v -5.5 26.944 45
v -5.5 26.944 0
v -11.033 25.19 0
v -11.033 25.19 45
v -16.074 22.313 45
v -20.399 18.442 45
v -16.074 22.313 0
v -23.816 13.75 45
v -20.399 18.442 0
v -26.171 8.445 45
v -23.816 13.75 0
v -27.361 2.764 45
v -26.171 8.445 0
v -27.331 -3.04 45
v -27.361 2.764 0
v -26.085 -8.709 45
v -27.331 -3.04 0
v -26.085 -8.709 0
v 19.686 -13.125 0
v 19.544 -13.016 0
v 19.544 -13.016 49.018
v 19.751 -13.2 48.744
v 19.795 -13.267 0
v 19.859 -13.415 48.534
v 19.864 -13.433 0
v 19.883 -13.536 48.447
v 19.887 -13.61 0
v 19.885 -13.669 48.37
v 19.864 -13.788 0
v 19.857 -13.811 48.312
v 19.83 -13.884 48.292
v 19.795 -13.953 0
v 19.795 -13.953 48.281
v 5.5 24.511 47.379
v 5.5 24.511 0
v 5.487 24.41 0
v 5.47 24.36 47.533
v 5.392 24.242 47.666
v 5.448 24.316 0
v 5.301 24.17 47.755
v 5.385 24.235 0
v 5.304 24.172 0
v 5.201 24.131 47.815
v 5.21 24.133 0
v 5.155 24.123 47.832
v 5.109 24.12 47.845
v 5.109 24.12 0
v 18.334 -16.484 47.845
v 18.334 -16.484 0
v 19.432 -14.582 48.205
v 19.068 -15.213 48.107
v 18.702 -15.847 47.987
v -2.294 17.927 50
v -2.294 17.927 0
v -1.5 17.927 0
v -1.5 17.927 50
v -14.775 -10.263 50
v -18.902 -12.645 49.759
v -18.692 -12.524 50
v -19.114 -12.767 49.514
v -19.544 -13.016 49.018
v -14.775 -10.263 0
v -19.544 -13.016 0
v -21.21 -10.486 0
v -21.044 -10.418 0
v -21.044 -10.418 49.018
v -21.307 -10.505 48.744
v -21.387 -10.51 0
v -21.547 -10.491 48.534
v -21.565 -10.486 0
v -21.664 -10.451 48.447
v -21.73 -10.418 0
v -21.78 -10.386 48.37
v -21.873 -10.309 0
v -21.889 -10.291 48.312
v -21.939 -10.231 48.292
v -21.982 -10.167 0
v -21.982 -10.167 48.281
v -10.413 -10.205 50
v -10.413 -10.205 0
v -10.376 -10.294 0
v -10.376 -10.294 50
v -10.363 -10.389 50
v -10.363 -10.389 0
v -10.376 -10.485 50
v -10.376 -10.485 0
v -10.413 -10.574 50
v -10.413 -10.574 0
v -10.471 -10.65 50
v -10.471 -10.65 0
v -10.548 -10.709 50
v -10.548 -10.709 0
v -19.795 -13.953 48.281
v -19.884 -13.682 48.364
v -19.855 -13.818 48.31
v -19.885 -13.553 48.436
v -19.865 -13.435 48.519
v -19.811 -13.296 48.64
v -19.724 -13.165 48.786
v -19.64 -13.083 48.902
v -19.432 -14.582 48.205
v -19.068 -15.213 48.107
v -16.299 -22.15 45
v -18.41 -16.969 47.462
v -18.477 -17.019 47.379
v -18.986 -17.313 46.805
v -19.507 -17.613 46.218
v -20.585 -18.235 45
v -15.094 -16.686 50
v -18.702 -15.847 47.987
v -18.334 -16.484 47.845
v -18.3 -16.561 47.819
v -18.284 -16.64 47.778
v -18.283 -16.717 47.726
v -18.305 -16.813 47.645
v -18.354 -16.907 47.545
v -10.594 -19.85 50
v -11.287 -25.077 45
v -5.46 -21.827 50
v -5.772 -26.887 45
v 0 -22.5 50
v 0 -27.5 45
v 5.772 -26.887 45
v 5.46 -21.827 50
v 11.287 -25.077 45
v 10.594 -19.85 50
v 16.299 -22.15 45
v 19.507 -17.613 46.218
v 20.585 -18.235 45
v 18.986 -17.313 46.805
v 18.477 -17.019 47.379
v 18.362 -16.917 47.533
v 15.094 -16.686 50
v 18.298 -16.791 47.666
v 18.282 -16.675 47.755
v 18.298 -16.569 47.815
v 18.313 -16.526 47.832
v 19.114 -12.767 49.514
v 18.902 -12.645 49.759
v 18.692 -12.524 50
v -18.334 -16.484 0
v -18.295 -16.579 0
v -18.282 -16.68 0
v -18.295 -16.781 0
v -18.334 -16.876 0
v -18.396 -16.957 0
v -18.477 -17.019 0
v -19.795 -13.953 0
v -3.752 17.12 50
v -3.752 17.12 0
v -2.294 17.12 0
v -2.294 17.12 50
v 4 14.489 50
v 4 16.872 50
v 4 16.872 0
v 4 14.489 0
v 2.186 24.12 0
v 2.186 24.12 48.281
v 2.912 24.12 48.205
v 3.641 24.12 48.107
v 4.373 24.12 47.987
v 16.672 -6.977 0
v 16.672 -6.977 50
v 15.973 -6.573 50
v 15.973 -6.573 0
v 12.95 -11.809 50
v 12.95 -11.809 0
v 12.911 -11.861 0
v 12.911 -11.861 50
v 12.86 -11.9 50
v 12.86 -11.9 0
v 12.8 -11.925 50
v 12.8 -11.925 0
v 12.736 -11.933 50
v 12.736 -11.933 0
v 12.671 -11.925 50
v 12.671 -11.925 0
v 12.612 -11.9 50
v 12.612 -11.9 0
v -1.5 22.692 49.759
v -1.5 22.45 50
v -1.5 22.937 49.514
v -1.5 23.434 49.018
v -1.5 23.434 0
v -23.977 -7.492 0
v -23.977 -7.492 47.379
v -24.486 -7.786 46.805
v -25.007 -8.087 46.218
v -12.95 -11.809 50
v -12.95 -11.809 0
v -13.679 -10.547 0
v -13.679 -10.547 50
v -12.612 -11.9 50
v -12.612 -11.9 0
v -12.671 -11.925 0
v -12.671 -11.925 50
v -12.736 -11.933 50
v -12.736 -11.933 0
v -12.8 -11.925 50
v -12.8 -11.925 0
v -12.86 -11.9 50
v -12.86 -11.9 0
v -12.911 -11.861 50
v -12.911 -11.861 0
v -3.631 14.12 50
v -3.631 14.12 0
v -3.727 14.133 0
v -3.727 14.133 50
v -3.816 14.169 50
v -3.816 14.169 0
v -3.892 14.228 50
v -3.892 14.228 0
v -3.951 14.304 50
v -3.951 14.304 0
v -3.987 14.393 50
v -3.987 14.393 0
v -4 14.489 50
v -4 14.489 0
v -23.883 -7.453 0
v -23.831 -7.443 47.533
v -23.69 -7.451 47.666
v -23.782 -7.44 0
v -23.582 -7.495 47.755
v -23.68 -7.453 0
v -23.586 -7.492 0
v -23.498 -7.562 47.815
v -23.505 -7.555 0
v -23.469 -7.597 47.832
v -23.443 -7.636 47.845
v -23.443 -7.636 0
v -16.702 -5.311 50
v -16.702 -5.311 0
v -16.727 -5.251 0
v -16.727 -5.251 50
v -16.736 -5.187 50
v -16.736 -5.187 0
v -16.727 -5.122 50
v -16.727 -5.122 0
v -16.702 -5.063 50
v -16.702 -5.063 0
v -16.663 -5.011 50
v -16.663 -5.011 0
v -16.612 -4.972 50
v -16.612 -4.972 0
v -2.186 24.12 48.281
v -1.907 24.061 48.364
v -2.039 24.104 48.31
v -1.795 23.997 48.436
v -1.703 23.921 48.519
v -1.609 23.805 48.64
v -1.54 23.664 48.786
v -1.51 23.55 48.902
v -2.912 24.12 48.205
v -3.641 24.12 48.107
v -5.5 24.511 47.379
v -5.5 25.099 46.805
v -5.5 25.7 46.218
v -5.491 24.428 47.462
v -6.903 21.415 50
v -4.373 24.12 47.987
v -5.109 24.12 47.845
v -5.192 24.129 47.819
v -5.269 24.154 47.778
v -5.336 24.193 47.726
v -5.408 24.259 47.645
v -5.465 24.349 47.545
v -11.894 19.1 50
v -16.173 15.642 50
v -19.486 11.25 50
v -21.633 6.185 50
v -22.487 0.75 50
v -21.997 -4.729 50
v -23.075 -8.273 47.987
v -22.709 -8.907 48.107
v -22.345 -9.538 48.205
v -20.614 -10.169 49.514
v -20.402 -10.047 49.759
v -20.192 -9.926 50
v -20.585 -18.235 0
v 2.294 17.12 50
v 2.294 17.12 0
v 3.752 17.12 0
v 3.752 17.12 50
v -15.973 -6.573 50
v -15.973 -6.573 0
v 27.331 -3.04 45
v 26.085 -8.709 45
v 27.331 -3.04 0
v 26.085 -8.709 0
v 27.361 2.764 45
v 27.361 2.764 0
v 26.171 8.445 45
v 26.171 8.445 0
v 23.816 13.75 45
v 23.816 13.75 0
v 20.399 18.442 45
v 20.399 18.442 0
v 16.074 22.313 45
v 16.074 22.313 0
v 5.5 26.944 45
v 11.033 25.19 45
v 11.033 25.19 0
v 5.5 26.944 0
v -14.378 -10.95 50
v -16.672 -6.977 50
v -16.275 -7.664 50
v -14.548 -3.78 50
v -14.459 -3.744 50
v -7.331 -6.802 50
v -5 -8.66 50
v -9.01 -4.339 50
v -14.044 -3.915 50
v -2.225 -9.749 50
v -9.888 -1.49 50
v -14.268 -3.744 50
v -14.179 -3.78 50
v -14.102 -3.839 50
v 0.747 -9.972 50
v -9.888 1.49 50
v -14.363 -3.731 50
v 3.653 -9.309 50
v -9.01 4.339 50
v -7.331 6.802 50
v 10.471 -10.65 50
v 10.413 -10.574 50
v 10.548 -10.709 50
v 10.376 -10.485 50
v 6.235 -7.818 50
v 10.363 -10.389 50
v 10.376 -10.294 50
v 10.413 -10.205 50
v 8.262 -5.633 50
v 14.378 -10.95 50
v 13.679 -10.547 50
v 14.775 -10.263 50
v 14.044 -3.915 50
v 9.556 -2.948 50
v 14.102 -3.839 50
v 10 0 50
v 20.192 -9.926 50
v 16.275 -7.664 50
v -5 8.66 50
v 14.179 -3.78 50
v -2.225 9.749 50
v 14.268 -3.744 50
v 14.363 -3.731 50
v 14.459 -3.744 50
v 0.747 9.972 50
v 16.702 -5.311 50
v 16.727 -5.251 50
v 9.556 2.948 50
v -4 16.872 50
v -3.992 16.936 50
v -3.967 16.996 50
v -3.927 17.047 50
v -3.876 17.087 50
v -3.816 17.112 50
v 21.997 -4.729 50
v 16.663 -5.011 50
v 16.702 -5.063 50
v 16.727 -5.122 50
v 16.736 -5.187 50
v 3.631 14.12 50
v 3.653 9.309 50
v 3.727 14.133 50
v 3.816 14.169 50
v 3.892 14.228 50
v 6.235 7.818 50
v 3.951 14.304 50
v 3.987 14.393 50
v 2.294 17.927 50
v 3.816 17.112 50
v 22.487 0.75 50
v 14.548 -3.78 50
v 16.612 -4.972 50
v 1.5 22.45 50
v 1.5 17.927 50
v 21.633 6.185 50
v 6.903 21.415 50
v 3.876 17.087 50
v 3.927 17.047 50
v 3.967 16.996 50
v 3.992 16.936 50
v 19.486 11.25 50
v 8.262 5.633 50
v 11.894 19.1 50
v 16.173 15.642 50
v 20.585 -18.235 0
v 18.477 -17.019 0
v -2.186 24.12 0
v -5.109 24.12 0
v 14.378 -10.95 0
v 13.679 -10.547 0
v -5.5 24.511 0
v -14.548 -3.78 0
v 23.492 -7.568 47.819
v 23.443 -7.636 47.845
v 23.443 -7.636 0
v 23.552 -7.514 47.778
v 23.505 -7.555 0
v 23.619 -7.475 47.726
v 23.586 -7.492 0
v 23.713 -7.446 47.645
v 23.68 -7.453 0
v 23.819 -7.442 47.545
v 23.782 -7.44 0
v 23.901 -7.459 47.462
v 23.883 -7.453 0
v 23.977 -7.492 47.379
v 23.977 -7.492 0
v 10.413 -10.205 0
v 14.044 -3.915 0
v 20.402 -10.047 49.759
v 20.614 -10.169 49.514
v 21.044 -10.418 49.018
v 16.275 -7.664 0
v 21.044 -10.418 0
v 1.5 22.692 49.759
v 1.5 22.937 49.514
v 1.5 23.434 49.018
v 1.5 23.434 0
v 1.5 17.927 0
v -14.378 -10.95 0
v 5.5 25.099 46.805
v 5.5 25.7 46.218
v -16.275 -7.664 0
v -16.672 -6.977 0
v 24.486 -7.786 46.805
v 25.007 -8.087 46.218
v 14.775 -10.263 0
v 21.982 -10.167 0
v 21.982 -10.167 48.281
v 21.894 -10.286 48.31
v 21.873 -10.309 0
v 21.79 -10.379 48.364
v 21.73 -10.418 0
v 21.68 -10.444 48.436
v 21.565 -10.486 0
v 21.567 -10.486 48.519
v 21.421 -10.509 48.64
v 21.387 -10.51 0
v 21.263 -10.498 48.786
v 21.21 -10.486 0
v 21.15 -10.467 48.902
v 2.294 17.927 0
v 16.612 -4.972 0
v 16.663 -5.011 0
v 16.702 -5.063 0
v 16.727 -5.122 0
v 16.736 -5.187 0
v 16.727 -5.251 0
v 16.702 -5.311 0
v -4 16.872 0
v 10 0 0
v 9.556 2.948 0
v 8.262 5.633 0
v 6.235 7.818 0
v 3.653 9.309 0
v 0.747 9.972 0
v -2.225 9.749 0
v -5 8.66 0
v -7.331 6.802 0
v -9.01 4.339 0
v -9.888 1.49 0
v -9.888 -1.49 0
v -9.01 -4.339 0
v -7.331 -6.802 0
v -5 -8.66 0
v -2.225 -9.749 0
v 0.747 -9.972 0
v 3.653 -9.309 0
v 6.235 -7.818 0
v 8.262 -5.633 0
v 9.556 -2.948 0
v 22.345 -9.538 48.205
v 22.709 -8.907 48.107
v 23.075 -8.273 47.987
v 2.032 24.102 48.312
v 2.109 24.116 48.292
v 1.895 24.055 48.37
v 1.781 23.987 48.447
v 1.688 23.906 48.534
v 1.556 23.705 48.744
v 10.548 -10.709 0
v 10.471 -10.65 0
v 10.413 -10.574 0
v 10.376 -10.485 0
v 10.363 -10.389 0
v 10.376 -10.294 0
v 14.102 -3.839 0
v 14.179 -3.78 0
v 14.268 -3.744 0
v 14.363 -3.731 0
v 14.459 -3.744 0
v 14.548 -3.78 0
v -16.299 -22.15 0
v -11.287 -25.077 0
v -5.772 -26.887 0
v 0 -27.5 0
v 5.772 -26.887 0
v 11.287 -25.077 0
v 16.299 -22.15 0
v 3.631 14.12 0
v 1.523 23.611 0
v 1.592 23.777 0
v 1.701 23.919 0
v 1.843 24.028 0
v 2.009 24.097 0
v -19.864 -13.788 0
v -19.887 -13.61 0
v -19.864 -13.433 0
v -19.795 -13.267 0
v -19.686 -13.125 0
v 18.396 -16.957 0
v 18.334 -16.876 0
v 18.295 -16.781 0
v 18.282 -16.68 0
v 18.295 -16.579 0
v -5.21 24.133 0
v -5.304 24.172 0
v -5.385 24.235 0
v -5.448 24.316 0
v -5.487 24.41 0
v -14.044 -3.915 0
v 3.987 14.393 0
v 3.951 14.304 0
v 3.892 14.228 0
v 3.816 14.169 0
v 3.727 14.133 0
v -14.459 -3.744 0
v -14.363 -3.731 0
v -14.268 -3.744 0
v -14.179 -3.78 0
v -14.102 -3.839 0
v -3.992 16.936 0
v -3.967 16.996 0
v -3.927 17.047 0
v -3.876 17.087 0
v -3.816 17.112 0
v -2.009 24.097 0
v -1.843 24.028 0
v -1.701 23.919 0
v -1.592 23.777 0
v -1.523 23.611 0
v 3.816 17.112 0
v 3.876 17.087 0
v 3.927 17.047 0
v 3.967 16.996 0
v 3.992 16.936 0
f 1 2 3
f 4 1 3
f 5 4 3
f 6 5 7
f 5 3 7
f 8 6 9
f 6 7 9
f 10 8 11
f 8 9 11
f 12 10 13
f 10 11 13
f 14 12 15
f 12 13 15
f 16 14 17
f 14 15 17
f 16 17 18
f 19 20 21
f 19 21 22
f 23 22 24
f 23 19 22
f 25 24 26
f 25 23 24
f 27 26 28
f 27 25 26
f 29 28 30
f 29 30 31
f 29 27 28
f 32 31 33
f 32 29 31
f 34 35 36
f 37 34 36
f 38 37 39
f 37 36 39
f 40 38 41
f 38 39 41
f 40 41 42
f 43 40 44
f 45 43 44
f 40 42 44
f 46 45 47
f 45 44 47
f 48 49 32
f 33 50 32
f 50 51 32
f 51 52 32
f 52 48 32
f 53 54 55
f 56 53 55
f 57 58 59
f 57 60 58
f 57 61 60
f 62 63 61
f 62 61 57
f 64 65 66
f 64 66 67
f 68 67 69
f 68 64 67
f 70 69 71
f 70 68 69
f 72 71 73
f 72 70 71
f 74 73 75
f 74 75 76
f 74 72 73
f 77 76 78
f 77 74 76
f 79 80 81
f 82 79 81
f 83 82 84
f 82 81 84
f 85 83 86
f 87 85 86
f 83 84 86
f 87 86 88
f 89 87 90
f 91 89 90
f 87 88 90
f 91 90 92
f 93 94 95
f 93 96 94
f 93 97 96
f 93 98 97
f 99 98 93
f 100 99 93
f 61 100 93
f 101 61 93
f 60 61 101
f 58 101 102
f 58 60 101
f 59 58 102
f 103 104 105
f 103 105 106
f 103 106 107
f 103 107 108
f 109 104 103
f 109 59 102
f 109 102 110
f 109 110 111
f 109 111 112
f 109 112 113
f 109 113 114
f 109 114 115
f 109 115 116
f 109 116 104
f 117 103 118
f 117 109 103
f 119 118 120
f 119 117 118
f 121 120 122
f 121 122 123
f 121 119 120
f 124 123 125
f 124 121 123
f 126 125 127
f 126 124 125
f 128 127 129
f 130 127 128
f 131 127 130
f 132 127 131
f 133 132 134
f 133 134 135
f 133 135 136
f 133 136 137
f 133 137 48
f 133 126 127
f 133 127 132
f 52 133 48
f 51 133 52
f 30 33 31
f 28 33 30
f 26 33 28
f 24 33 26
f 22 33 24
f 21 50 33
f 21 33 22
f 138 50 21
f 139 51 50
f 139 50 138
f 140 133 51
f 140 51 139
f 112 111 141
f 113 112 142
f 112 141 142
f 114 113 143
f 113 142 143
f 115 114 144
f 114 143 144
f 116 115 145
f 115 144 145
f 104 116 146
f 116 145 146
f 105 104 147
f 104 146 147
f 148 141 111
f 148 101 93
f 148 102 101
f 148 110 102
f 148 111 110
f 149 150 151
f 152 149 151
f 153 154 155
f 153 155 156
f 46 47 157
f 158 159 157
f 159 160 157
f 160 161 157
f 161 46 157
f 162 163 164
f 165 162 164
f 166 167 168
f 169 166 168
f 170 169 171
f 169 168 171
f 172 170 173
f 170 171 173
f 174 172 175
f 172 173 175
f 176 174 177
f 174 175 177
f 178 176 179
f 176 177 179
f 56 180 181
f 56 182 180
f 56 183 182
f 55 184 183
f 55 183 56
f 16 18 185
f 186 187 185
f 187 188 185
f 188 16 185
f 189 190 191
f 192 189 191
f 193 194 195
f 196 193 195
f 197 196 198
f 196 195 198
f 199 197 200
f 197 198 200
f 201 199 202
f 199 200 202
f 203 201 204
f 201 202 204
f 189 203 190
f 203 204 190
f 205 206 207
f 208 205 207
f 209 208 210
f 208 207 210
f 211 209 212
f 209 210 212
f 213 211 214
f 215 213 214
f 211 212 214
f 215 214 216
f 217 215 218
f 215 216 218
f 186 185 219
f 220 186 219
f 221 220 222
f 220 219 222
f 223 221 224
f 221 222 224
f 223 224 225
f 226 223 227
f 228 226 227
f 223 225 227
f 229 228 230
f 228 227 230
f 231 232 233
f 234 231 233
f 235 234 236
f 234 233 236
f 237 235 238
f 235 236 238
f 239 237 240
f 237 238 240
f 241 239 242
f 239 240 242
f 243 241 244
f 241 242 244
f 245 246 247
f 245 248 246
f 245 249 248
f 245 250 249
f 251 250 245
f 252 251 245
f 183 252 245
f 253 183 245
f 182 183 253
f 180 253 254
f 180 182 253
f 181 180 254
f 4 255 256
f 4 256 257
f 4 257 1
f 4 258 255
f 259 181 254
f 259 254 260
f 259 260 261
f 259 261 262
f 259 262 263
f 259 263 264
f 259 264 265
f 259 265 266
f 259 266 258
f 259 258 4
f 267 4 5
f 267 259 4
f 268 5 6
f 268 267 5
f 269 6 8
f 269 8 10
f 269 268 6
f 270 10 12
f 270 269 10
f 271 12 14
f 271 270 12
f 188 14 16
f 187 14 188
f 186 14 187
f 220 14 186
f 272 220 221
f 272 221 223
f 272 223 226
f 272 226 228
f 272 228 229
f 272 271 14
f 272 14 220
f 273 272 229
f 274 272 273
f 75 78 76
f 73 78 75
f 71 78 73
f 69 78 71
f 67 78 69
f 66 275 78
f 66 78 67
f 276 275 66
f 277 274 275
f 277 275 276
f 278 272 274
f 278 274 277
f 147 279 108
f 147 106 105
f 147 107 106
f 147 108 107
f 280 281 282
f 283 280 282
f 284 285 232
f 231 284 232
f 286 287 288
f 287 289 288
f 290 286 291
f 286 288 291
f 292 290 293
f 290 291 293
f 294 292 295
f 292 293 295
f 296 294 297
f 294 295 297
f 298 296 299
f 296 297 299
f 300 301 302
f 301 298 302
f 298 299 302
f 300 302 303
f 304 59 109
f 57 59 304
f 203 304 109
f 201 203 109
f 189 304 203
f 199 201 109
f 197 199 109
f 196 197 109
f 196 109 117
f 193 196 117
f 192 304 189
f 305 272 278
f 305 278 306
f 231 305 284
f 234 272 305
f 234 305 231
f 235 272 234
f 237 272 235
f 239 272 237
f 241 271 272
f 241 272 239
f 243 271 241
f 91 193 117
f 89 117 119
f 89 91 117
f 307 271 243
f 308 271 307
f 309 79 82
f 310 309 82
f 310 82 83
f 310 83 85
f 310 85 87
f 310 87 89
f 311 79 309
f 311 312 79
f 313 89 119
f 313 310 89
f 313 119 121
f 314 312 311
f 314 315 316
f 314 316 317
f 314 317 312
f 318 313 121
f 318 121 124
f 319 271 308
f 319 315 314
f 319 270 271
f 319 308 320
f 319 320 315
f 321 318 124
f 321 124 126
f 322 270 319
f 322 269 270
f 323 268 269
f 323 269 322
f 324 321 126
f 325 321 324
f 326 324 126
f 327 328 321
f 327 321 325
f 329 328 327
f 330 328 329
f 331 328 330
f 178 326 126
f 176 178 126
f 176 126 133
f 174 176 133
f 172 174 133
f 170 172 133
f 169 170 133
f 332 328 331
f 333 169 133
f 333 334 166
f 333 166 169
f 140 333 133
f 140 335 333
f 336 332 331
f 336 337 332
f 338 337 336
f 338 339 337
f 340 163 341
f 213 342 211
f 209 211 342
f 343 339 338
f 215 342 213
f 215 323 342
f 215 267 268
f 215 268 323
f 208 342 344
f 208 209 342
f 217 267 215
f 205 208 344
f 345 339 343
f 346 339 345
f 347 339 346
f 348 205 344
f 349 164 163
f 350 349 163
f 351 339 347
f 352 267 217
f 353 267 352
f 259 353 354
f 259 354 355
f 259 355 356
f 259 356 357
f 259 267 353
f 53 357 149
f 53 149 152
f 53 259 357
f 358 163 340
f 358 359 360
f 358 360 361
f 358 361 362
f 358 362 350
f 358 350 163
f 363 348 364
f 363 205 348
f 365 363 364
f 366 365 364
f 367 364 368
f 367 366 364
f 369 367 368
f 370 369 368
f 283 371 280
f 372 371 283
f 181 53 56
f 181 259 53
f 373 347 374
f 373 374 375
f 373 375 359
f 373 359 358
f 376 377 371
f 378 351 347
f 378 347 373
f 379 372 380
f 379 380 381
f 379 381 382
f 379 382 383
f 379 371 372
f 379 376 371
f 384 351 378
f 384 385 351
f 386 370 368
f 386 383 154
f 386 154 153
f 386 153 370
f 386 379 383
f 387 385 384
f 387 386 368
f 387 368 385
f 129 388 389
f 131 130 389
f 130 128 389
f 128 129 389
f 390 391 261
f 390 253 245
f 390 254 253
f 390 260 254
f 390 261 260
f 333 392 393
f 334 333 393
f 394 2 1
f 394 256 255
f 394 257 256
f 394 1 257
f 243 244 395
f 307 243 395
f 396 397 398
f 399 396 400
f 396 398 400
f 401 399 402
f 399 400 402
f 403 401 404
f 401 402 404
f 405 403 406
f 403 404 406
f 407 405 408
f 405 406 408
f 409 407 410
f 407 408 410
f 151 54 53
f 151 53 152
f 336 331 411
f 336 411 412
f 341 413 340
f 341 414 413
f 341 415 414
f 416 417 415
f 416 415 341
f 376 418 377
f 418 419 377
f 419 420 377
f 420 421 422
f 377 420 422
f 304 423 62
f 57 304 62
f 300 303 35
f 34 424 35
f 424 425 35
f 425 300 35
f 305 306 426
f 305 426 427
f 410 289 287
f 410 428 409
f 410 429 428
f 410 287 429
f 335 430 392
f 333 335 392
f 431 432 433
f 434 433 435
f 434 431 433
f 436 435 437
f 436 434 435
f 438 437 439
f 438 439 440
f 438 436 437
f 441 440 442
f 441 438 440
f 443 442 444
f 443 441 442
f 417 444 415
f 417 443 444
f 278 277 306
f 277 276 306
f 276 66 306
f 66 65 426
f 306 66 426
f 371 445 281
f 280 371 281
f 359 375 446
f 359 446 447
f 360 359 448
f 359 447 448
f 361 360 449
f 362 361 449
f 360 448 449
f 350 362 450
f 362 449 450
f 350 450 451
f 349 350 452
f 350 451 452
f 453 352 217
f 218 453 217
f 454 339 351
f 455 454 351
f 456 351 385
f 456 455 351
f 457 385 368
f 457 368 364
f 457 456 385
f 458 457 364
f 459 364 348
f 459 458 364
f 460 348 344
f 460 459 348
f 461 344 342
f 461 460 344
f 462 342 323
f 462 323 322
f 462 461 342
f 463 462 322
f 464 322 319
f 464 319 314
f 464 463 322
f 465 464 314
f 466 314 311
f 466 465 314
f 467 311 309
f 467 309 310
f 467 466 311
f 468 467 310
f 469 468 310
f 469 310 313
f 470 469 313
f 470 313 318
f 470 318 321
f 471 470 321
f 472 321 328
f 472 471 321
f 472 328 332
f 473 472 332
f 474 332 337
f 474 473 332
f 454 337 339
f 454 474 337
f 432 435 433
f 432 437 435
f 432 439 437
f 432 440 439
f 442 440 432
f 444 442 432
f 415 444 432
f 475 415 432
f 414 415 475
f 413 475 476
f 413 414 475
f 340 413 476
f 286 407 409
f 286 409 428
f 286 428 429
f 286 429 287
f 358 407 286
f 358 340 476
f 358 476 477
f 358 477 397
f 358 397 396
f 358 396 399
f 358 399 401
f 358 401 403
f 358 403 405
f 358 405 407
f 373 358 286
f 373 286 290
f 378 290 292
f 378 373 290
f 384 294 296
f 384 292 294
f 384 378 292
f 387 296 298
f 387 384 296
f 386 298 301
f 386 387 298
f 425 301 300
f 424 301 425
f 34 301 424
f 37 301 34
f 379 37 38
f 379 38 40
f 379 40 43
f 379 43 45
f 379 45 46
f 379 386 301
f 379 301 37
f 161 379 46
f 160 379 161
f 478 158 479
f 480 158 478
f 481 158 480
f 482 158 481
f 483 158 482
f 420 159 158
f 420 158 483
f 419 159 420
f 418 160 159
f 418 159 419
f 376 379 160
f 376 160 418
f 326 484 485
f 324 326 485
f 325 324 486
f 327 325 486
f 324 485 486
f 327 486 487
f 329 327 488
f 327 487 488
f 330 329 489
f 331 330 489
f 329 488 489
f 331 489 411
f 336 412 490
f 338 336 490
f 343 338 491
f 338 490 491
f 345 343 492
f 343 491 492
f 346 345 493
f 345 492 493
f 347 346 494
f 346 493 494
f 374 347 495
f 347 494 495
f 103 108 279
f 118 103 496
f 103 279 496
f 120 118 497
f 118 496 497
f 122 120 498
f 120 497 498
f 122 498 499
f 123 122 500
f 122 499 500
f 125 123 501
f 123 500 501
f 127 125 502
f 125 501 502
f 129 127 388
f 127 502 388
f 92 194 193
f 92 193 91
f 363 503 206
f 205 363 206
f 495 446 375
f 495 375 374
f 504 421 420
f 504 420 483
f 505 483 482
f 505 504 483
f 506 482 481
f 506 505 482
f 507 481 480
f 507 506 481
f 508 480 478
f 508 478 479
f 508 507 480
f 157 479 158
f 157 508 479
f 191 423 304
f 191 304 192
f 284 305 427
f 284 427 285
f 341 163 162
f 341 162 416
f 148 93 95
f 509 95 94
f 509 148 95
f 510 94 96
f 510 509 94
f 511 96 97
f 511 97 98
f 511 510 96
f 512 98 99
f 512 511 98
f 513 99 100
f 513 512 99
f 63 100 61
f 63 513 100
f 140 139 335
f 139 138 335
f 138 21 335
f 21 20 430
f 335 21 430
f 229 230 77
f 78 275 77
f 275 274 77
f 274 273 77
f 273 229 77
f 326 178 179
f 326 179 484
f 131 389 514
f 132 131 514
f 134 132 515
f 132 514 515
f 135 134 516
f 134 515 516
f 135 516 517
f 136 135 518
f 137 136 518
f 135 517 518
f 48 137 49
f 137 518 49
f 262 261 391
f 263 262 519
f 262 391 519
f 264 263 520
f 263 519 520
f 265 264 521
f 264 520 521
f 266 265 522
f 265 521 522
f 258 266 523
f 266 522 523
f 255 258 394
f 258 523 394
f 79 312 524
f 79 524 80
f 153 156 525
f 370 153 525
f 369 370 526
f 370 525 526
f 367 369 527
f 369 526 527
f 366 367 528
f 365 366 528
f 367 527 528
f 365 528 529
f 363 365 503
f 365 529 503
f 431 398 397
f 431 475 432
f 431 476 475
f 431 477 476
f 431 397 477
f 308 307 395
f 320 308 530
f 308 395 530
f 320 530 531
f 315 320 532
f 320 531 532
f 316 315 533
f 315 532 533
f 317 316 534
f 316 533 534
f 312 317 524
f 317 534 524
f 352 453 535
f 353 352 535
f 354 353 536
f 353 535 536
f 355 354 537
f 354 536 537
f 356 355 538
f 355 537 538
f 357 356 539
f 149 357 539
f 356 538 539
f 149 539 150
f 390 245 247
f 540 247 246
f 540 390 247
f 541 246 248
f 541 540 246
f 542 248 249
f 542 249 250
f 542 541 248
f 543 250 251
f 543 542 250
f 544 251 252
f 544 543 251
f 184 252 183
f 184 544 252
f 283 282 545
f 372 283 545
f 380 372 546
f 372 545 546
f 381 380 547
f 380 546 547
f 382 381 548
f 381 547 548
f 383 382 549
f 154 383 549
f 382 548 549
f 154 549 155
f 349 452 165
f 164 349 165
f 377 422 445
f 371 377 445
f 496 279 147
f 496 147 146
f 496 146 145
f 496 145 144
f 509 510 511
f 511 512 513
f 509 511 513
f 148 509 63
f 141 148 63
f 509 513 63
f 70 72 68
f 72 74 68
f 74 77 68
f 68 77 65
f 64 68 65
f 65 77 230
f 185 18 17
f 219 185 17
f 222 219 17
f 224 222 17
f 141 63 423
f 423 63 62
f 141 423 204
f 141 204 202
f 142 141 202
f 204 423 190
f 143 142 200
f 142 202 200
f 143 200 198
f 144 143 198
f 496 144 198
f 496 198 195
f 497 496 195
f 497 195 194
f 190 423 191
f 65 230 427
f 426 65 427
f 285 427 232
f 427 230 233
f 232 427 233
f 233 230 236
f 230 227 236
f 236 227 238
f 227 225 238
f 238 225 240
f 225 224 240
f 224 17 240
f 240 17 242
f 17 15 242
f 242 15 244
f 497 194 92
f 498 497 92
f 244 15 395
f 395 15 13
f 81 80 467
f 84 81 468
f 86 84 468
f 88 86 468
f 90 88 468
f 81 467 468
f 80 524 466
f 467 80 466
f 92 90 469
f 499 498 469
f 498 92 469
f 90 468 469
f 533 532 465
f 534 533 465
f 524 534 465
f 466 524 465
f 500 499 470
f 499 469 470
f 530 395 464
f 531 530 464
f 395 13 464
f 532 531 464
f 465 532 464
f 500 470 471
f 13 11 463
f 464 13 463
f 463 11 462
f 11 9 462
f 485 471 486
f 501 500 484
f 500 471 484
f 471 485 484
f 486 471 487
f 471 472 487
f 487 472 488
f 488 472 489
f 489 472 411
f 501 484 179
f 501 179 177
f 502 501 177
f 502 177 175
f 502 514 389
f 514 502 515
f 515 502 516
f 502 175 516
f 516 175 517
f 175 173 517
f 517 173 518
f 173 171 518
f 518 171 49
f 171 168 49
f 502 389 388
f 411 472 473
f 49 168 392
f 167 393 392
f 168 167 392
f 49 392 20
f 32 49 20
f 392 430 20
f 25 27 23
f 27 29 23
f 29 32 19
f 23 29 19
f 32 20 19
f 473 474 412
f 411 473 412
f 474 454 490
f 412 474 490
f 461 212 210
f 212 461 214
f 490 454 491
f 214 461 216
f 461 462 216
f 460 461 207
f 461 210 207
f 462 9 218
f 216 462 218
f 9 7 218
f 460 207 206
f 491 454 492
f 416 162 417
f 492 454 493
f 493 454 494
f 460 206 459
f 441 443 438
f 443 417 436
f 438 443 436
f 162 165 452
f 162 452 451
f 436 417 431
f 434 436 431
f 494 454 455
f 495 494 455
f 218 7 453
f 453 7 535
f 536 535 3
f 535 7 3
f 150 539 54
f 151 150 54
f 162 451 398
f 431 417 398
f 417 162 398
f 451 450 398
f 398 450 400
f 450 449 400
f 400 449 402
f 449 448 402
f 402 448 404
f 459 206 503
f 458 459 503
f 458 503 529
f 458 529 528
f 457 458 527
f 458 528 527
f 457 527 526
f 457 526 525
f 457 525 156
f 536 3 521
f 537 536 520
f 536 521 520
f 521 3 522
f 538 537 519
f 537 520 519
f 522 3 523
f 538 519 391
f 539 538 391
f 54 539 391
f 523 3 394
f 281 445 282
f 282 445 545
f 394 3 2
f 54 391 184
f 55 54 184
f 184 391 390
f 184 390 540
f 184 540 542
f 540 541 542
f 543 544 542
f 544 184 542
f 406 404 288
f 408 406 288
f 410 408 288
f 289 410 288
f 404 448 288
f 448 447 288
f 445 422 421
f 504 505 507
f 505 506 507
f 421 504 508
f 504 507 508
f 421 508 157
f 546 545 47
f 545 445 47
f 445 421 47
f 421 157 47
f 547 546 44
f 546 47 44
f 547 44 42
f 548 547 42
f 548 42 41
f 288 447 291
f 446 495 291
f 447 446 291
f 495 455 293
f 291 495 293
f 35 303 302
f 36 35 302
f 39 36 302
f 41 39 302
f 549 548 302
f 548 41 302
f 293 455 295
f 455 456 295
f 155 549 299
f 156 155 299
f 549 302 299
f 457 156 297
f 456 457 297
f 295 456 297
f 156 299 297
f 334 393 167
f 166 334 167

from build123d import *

# Parameters (mm, degrees)
SKETCH_R     = 27.5
SKETCH_R_2   = 10
PAD_DEPTH    = 50
CHAMFER_SIZE = 5
POCKET_DEPTH = 50.001


with BuildPart() as part:
    # Sketch → Pad (new body)
    with BuildSketch(Plane.XY):
        Circle(SKETCH_R)
        Circle(SKETCH_R_2, mode=Mode.SUBTRACT)
    extrude(amount=PAD_DEPTH)

    # Chamfer
    chamfer_edges = [part.edges().sort_by_distance(p)[0] for p in [
        (-27.5, 0, 50),
    ]]
    chamfer(chamfer_edges, length=CHAMFER_SIZE)

    # Sketch001 → Pocket (cut, through all)
    with BuildSketch(Plane(origin=(0, 0, 0), x_dir=(1, 0, 0), z_dir=(0, 0, -1))):
        with BuildLine():
            Line((5.5, -27.883587), (5.5, -24.511159))
            ThreePointArc((5.5, -24.511159), (5.385432, -24.234568), (5.108841, -24.12))
            Line((5.108841, -24.12), (2.186238, -24.12))
            ThreePointArc((1.5, -23.433762), (1.700994, -23.919006), (2.186238, -24.12))
            Line((1.5, -23.433762), (1.5, -17.926959))
            Line((1.5, -17.926959), (2.294017, -17.926959))
            Line((2.294017, -17.926959), (2.294017, -17.12))
            Line((2.294017, -17.12), (3.752143, -17.12))
            ThreePointArc((3.752143, -17.12), (3.927404, -17.047404), (4, -16.872143))
            Line((4, -16.872143), (4, -14.488966))
            ThreePointArc((4, -14.488966), (3.891932, -14.228068), (3.631034, -14.12))
            Line((3.631034, -14.12), (-3.631034, -14.12))
            ThreePointArc((-3.631034, -14.12), (-3.891932, -14.228068), (-4, -14.488966))
            Line((-4, -16.872143), (-4, -14.488966))
            ThreePointArc((-4, -16.872143), (-3.927404, -17.047404), (-3.752143, -17.12))
            Line((-3.752143, -17.12), (-2.294017, -17.12))
            Line((-2.294017, -17.926959), (-2.294017, -17.12))
            Line((-2.294017, -17.926959), (-1.5, -17.926959))
            Line((-1.5, -23.433762), (-1.5, -17.926959))
            ThreePointArc((-2.186238, -24.12), (-1.700994, -23.919006), (-1.5, -23.433762))
            Line((-5.108841, -24.12), (-2.186238, -24.12))
            ThreePointArc((-5.108841, -24.12), (-5.385432, -24.234568), (-5.5, -24.511159))
            Line((-5.5, -27.883587), (-5.5, -24.511159))
            Line((-5.5, -27.883587), (5.5, -27.883587))
        make_face()
        with BuildLine():
            Line((21.397895, 18.704933), (18.477287, 17.018719))
            ThreePointArc((18.477287, 17.018719), (18.295036, 16.781205), (18.334112, 16.484386))
            Line((18.334112, 16.484386), (19.795414, 13.953338))
            ThreePointArc((19.544233, 13.01592), (19.863969, 13.432608), (19.795414, 13.953338))
            Line((19.544233, 13.01592), (14.775202, 10.262518))
            Line((14.775202, 10.262518), (14.378193, 10.950156))
            Line((14.378193, 10.950156), (13.679346, 10.546677))
            Line((13.679346, 10.546677), (12.950283, 11.809451))
            ThreePointArc((12.950283, 11.809451), (12.799783, 11.924934), (12.611704, 11.900173))
            Line((12.611704, 11.900173), (10.547813, 10.708585))
            ThreePointArc((10.547813, 10.708585), (10.375902, 10.484546), (10.412762, 10.204568))
            Line((10.412762, 10.204568), (14.043796, 3.915432))
            ThreePointArc((14.043796, 3.915432), (14.267834, 3.743521), (14.547813, 3.780381))
            Line((16.611705, 4.971969), (14.547813, 3.780381))
            ThreePointArc((16.611705, 4.971969), (16.727187, 5.12247), (16.702426, 5.310548))
            Line((16.702426, 5.310548), (15.973363, 6.573323))
            Line((16.67221, 6.976803), (15.973363, 6.573323))
            Line((16.67221, 6.976803), (16.275202, 7.664442))
            Line((21.044233, 10.417843), (16.275202, 7.664442))
            ThreePointArc((21.981652, 10.166663), (21.564963, 10.486398), (21.044233, 10.417843))
            Line((23.442954, 7.635614), (21.981652, 10.166663))
            ThreePointArc((23.442954, 7.635614), (23.680468, 7.453363), (23.977287, 7.492439))
            Line((26.897895, 9.178654), (23.977287, 7.492439))
            Line((26.897895, 9.178654), (21.397895, 18.704933))
        make_face()
        with BuildLine():
            Line((-26.897895, 9.178654), (-23.977287, 7.492439))
            ThreePointArc((-23.977287, 7.492439), (-23.680468, 7.453363), (-23.442954, 7.635614))
            Line((-23.442954, 7.635614), (-21.981652, 10.166662))
            ThreePointArc((-21.044233, 10.417843), (-21.564964, 10.486398), (-21.981652, 10.166662))
            Line((-21.044233, 10.417843), (-16.275202, 7.664441))
            Line((-16.275202, 7.664441), (-16.67221, 6.976803))
            Line((-16.67221, 6.976803), (-15.973363, 6.573323))
            Line((-15.973363, 6.573323), (-16.702426, 5.310548))
            ThreePointArc((-16.702426, 5.310548), (-16.727188, 5.12247), (-16.611705, 4.971969))
            Line((-16.611705, 4.971969), (-14.547813, 3.780381))
            ThreePointArc((-14.547813, 3.780381), (-14.267835, 3.743521), (-14.043796, 3.915432))
            Line((-14.043796, 3.915432), (-10.412762, 10.204568))
            ThreePointArc((-10.412762, 10.204568), (-10.375902, 10.484547), (-10.547813, 10.708585))
            Line((-12.611705, 11.900174), (-10.547813, 10.708585))
            ThreePointArc((-12.611705, 11.900174), (-12.799783, 11.924935), (-12.950284, 11.809451))
            Line((-12.950284, 11.809451), (-13.679346, 10.546677))
            Line((-14.378193, 10.950156), (-13.679346, 10.546677))
            Line((-14.378193, 10.950156), (-14.775202, 10.262518))
            Line((-19.544233, 13.015919), (-14.775202, 10.262518))
            ThreePointArc((-19.795414, 13.953338), (-19.863969, 13.432608), (-19.544233, 13.015919))
            Line((-18.334112, 16.484386), (-19.795414, 13.953338))
            ThreePointArc((-18.334112, 16.484386), (-18.295036, 16.781205), (-18.477287, 17.018719))
            Line((-21.397895, 18.704933), (-18.477287, 17.018719))
            Line((-21.397895, 18.704933), (-26.897895, 9.178654))
        make_face()
    extrude(amount=-POCKET_DEPTH, mode=Mode.SUBTRACT)


solid = part.part
